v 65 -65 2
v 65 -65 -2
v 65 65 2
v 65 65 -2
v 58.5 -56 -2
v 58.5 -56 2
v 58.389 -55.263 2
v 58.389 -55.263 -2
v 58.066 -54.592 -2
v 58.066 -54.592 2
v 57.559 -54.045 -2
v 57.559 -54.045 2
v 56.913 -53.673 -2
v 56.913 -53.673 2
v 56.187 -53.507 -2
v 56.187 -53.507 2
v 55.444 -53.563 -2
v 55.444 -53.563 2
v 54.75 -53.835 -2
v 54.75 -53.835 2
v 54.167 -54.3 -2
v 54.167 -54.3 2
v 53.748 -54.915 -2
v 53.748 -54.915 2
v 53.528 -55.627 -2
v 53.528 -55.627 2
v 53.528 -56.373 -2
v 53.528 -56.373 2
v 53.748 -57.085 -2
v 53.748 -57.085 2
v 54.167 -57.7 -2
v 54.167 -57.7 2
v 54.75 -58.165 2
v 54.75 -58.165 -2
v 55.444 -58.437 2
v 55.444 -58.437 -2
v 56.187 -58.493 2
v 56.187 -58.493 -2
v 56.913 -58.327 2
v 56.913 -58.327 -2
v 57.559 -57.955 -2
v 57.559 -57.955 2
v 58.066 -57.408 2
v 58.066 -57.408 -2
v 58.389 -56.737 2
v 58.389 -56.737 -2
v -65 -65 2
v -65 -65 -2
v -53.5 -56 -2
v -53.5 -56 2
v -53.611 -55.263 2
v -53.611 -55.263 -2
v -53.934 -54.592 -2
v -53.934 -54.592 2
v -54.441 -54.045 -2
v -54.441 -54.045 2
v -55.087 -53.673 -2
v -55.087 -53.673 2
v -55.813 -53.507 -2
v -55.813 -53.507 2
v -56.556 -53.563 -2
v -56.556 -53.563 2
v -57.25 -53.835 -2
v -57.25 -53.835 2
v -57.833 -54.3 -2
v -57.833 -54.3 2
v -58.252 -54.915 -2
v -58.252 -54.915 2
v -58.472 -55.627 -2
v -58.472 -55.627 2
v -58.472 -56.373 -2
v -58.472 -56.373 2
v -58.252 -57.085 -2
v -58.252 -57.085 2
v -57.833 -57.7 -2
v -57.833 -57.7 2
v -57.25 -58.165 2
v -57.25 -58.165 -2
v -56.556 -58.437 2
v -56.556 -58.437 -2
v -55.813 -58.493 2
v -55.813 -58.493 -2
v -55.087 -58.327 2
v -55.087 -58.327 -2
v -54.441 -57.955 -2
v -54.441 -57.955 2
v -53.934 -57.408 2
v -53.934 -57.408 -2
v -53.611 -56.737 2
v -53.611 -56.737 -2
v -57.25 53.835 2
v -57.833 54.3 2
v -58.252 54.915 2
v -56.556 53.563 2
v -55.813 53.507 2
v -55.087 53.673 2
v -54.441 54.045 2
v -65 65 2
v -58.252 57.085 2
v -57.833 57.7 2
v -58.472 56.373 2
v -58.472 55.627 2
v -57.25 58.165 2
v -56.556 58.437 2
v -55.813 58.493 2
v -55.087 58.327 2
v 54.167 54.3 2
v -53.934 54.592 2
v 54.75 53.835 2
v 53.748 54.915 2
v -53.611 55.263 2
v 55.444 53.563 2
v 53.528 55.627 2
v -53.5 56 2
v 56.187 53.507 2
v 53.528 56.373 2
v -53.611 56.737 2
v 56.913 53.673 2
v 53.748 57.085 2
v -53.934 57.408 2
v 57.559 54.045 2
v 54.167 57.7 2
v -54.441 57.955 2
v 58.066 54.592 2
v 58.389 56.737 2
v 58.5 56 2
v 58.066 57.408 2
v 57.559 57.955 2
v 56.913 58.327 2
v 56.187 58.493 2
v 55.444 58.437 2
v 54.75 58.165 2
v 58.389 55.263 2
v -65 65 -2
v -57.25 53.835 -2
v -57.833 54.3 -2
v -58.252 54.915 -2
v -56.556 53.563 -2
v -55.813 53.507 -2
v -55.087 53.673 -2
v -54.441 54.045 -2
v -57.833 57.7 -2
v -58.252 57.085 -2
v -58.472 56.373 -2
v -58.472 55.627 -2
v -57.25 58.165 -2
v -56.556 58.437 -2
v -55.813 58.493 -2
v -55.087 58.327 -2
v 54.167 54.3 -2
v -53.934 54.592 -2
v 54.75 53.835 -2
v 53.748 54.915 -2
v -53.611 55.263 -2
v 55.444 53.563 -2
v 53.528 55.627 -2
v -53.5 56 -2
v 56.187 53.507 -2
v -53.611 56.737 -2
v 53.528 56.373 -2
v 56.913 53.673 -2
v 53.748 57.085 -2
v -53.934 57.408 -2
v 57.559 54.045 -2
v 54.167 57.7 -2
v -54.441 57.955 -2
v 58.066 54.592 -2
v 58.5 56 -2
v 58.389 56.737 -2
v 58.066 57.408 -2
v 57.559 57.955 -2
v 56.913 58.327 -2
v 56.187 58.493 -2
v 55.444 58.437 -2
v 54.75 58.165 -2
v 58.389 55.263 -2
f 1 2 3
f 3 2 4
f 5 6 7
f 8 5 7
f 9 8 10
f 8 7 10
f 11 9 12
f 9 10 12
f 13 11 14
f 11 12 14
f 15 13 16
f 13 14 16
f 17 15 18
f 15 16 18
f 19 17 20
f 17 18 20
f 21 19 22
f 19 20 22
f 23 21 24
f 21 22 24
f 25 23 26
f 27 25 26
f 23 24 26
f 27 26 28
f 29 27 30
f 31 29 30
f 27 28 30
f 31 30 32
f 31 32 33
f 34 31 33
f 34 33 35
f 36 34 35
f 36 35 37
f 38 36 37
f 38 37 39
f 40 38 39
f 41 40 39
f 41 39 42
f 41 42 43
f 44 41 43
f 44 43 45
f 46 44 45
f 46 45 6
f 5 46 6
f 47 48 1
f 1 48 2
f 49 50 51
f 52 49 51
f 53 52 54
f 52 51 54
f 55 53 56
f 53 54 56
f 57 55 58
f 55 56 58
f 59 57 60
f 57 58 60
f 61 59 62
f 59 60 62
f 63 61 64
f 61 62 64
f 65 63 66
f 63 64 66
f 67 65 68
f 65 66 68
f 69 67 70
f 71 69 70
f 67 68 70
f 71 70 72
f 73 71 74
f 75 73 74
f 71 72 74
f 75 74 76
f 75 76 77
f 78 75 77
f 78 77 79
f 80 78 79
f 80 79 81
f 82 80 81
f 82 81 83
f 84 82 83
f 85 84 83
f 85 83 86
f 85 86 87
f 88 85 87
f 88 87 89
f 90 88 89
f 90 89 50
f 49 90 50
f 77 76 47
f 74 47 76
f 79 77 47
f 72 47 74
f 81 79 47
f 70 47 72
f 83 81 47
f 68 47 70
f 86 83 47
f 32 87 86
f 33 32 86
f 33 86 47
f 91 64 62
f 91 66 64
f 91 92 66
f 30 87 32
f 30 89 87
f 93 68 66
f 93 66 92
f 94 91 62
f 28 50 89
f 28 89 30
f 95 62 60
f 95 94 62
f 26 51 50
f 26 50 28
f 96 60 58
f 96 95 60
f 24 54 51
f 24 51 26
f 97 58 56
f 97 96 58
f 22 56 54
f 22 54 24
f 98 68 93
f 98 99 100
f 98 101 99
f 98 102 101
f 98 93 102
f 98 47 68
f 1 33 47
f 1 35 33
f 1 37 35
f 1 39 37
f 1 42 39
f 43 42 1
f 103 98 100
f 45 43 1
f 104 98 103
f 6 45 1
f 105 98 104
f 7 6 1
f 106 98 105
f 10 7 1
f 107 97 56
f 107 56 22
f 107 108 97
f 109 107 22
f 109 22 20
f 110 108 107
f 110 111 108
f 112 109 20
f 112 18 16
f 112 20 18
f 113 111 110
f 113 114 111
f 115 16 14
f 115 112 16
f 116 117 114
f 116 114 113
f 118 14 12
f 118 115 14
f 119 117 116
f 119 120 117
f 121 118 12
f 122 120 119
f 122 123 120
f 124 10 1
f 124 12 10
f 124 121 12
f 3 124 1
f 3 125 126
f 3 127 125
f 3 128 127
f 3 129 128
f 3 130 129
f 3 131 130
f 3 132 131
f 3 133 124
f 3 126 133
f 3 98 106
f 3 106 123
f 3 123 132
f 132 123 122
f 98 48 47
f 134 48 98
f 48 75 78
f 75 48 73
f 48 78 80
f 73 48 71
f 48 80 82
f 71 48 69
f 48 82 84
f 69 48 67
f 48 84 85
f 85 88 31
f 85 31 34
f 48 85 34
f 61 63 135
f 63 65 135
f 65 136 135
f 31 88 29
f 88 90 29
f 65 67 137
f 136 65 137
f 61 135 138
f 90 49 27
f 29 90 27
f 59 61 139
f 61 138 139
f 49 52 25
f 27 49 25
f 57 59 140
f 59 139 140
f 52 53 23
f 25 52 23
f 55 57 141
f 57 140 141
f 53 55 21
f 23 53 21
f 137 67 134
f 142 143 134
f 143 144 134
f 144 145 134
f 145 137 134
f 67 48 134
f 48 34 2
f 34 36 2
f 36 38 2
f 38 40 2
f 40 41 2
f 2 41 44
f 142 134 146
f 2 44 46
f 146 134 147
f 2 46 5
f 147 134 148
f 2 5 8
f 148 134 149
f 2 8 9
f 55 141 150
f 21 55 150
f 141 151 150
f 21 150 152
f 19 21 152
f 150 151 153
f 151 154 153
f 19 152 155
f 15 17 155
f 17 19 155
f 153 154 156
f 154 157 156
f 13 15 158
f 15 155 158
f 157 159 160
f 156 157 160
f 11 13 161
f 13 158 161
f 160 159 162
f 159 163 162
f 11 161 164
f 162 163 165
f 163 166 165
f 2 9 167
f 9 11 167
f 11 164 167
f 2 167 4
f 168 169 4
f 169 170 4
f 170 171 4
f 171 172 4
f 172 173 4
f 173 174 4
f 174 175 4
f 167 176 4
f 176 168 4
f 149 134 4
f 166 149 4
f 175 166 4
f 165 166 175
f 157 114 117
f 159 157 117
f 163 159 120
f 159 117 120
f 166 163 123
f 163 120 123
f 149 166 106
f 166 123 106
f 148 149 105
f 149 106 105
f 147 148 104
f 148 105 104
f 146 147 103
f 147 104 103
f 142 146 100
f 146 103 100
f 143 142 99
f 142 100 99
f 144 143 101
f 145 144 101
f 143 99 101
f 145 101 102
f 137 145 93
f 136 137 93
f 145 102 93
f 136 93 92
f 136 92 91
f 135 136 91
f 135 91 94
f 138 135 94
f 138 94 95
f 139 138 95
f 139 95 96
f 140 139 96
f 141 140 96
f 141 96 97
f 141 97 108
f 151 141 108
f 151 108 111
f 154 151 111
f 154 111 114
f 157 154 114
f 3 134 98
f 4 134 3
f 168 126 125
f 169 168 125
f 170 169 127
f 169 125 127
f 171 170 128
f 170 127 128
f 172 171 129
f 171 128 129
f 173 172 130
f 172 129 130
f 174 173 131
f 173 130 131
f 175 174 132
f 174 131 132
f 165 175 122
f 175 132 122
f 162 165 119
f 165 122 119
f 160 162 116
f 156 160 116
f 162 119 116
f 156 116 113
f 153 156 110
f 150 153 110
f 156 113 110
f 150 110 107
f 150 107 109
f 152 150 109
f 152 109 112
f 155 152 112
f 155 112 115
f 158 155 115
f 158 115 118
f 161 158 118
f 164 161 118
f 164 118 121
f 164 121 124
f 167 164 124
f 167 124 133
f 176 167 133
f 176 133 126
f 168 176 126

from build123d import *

# Parameters (mm, degrees)
BOSS_EXTRUDE1_DEPTH         = 2
BOSS_EXTRUDE1_DEPTH_BACK    = 2
SKETCH1_W                   = 130
SKETCH1_H                   = 130
TAP_DRILL_FOR_M5X0_8_TAP1_D = 5


with BuildPart() as part:
    # Sketch1 → Boss-Extrude1 (new, two sides: drawn at the far end of the back side and taken through both)
    with BuildSketch(Plane.XY.offset(-BOSS_EXTRUDE1_DEPTH_BACK)):
        Rectangle(SKETCH1_W, SKETCH1_H)
    extrude(amount=BOSS_EXTRUDE1_DEPTH + BOSS_EXTRUDE1_DEPTH_BACK)

    # Tap Drill for M5x0.8 Tap1 (through all)
    with Locations(Plane(origin=(0, 0, -2), x_dir=(-1, 0, 0), z_dir=(0, 0, -1))):
        with Locations((-56, 56), (56, 56), (56, -56), (-56, -56)):
            Hole(TAP_DRILL_FOR_M5X0_8_TAP1_D / 2)


solid = part.part
